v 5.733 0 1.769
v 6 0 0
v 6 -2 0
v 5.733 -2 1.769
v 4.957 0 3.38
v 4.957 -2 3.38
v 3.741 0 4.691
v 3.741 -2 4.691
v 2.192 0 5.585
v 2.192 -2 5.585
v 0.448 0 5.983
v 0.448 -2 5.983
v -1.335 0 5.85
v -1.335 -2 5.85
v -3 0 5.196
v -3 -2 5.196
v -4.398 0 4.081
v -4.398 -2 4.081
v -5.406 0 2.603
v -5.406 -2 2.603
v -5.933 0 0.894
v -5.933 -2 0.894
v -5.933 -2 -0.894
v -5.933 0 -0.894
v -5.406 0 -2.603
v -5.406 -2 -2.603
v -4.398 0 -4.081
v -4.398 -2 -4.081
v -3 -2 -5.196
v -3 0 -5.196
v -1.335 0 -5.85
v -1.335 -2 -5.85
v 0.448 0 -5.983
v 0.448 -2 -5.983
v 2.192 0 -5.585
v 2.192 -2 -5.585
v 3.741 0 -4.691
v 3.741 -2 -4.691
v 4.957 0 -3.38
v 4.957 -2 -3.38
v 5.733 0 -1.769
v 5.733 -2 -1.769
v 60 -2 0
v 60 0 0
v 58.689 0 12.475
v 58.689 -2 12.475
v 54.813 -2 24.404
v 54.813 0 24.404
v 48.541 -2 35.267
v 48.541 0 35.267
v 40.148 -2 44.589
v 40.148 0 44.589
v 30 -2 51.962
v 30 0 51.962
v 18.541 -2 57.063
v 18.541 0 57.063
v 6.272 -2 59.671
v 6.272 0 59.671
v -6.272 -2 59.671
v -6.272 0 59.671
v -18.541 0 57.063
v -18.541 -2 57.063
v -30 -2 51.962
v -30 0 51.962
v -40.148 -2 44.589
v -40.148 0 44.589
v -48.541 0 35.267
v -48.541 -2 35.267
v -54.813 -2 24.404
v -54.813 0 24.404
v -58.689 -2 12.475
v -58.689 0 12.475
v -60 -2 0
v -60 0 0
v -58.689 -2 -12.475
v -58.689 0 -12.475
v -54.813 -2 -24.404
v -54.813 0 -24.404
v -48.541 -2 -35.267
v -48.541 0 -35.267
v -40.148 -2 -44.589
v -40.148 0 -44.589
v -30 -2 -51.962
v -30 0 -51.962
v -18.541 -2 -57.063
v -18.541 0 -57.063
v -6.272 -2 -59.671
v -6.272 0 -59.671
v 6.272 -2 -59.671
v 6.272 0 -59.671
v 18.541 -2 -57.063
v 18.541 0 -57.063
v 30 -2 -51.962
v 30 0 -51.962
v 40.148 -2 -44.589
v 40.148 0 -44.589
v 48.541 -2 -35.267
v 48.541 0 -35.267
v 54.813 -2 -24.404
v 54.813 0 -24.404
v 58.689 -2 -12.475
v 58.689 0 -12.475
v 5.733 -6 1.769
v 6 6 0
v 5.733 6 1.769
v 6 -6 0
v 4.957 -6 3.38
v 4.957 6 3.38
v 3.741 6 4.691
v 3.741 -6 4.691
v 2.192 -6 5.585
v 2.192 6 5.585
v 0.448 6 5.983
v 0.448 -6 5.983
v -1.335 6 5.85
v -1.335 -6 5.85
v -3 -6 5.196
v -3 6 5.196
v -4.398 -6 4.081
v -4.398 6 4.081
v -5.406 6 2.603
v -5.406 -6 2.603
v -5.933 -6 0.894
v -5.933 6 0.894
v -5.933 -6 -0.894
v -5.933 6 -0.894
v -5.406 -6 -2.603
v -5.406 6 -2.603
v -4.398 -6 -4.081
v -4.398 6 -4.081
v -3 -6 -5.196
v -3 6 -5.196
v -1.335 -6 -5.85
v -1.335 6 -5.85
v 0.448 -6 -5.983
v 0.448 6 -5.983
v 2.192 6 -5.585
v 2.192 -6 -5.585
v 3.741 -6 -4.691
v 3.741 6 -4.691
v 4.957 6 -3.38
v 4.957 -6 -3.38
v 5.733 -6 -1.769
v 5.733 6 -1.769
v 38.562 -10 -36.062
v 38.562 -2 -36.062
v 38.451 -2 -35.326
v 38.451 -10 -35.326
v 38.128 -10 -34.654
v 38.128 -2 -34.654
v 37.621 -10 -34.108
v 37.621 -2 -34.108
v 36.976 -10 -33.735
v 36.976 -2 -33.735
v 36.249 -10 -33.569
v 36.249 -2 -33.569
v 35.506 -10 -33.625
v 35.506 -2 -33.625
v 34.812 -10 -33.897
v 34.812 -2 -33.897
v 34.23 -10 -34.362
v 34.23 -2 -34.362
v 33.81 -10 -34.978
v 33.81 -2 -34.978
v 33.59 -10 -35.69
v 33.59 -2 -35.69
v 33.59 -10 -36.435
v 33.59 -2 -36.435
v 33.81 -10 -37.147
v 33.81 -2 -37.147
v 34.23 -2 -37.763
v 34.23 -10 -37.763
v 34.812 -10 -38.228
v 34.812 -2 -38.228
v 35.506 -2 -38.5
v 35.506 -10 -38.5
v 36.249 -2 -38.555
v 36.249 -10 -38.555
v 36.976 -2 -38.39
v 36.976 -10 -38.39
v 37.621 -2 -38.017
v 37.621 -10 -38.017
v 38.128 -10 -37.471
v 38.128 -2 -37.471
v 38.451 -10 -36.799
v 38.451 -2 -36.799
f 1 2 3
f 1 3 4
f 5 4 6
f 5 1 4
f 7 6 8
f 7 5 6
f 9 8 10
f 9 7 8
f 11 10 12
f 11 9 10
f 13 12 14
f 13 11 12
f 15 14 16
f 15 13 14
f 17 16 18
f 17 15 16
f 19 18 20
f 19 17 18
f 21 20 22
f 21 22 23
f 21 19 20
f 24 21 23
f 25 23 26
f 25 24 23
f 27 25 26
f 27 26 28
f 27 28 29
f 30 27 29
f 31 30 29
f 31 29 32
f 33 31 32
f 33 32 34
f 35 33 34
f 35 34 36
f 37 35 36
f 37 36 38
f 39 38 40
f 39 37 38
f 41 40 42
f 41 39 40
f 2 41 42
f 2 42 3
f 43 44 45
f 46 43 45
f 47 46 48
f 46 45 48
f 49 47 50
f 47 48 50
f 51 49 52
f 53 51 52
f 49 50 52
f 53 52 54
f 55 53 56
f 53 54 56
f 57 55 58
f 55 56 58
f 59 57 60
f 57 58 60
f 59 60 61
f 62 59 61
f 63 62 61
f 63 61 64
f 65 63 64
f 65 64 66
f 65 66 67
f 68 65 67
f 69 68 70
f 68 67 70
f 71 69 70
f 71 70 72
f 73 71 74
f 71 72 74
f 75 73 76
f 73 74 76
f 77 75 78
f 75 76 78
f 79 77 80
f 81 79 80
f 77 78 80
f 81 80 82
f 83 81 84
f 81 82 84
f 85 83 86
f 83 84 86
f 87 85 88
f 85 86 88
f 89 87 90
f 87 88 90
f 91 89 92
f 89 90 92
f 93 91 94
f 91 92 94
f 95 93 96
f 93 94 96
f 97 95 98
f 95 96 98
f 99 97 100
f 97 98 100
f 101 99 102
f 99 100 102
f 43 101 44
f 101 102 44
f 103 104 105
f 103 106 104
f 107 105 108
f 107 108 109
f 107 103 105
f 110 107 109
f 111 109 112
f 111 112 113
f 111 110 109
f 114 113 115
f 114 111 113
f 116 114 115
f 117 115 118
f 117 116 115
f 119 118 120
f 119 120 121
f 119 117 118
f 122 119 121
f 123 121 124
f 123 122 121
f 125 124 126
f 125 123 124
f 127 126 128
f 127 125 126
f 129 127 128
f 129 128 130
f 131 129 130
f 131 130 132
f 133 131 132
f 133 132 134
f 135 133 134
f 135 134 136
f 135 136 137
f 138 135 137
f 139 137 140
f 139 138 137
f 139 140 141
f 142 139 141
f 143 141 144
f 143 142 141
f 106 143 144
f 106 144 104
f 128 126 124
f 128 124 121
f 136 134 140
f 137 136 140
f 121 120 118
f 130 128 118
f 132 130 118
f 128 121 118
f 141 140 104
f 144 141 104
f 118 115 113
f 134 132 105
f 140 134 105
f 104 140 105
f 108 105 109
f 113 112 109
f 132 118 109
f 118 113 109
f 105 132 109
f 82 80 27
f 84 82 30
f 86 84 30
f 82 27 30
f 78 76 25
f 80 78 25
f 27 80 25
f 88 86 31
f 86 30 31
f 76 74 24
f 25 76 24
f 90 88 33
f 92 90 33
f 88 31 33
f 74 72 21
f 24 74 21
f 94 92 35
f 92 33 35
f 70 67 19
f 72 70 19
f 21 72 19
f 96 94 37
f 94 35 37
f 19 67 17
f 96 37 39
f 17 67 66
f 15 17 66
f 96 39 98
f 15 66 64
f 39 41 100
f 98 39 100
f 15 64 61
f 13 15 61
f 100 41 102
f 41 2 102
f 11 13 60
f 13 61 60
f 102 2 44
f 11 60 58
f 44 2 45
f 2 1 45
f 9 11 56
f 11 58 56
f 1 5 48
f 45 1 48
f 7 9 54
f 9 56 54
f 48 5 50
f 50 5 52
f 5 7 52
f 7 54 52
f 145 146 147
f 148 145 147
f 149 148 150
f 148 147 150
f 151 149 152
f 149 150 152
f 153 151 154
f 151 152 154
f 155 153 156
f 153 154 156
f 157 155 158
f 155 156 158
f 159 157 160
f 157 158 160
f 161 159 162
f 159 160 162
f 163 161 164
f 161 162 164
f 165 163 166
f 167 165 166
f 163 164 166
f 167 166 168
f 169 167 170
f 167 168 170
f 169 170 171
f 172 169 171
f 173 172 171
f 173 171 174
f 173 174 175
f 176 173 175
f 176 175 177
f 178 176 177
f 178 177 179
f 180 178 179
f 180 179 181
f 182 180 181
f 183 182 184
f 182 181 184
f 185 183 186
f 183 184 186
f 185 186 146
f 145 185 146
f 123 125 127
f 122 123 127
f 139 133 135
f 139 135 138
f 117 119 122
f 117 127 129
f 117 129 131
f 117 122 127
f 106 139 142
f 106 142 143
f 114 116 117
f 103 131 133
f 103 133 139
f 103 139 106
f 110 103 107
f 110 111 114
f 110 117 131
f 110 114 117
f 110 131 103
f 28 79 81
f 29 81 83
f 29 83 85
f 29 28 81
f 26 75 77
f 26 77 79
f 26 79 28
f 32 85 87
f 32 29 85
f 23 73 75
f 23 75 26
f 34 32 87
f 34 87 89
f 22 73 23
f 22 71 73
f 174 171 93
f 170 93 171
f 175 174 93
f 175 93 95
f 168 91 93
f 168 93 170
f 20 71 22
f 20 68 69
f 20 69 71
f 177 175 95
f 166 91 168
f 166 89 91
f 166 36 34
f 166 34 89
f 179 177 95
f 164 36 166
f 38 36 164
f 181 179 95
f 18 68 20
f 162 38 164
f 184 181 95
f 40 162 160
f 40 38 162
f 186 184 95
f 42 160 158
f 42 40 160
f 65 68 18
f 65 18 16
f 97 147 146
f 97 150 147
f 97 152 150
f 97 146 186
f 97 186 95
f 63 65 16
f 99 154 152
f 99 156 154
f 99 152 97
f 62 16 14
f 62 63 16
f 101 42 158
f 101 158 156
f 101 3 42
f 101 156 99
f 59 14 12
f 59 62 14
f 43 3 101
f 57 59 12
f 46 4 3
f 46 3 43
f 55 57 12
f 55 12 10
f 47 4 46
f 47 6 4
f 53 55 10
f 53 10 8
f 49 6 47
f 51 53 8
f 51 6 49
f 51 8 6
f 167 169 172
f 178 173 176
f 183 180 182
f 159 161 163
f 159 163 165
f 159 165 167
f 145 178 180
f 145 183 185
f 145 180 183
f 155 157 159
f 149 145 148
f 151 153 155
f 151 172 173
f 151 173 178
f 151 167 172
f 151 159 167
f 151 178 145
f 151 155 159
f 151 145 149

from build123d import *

# Parameters (mm, degrees)
F0_R     = 60
F0_R_2   = 6
F1_DEPTH = 2
F2_DEPTH = 6
F3_R     = 2.5
F4_DEPTH = 8


with BuildPart() as f1:
    # F0 (on Front) → F1 (new body)
    with BuildSketch(Plane.XZ):
        Circle(F0_R)
        Circle(F0_R_2, mode=Mode.SUBTRACT)
    extrude(amount=F1_DEPTH)

    # F3 (on face) → F4 (join)
    with BuildSketch(Plane.XZ.offset(2)):
        with Locations((36.062446, -36.062446)):
            Circle(F3_R)
    extrude(amount=F4_DEPTH)


with BuildPart() as f2:
    # F0 (on Front) → F2 (new body, symmetric)
    with BuildSketch(Plane.XZ):
        Circle(F0_R_2)
    extrude(amount=F2_DEPTH, both=True)


solid = Compound([f1.part, f2.part])
